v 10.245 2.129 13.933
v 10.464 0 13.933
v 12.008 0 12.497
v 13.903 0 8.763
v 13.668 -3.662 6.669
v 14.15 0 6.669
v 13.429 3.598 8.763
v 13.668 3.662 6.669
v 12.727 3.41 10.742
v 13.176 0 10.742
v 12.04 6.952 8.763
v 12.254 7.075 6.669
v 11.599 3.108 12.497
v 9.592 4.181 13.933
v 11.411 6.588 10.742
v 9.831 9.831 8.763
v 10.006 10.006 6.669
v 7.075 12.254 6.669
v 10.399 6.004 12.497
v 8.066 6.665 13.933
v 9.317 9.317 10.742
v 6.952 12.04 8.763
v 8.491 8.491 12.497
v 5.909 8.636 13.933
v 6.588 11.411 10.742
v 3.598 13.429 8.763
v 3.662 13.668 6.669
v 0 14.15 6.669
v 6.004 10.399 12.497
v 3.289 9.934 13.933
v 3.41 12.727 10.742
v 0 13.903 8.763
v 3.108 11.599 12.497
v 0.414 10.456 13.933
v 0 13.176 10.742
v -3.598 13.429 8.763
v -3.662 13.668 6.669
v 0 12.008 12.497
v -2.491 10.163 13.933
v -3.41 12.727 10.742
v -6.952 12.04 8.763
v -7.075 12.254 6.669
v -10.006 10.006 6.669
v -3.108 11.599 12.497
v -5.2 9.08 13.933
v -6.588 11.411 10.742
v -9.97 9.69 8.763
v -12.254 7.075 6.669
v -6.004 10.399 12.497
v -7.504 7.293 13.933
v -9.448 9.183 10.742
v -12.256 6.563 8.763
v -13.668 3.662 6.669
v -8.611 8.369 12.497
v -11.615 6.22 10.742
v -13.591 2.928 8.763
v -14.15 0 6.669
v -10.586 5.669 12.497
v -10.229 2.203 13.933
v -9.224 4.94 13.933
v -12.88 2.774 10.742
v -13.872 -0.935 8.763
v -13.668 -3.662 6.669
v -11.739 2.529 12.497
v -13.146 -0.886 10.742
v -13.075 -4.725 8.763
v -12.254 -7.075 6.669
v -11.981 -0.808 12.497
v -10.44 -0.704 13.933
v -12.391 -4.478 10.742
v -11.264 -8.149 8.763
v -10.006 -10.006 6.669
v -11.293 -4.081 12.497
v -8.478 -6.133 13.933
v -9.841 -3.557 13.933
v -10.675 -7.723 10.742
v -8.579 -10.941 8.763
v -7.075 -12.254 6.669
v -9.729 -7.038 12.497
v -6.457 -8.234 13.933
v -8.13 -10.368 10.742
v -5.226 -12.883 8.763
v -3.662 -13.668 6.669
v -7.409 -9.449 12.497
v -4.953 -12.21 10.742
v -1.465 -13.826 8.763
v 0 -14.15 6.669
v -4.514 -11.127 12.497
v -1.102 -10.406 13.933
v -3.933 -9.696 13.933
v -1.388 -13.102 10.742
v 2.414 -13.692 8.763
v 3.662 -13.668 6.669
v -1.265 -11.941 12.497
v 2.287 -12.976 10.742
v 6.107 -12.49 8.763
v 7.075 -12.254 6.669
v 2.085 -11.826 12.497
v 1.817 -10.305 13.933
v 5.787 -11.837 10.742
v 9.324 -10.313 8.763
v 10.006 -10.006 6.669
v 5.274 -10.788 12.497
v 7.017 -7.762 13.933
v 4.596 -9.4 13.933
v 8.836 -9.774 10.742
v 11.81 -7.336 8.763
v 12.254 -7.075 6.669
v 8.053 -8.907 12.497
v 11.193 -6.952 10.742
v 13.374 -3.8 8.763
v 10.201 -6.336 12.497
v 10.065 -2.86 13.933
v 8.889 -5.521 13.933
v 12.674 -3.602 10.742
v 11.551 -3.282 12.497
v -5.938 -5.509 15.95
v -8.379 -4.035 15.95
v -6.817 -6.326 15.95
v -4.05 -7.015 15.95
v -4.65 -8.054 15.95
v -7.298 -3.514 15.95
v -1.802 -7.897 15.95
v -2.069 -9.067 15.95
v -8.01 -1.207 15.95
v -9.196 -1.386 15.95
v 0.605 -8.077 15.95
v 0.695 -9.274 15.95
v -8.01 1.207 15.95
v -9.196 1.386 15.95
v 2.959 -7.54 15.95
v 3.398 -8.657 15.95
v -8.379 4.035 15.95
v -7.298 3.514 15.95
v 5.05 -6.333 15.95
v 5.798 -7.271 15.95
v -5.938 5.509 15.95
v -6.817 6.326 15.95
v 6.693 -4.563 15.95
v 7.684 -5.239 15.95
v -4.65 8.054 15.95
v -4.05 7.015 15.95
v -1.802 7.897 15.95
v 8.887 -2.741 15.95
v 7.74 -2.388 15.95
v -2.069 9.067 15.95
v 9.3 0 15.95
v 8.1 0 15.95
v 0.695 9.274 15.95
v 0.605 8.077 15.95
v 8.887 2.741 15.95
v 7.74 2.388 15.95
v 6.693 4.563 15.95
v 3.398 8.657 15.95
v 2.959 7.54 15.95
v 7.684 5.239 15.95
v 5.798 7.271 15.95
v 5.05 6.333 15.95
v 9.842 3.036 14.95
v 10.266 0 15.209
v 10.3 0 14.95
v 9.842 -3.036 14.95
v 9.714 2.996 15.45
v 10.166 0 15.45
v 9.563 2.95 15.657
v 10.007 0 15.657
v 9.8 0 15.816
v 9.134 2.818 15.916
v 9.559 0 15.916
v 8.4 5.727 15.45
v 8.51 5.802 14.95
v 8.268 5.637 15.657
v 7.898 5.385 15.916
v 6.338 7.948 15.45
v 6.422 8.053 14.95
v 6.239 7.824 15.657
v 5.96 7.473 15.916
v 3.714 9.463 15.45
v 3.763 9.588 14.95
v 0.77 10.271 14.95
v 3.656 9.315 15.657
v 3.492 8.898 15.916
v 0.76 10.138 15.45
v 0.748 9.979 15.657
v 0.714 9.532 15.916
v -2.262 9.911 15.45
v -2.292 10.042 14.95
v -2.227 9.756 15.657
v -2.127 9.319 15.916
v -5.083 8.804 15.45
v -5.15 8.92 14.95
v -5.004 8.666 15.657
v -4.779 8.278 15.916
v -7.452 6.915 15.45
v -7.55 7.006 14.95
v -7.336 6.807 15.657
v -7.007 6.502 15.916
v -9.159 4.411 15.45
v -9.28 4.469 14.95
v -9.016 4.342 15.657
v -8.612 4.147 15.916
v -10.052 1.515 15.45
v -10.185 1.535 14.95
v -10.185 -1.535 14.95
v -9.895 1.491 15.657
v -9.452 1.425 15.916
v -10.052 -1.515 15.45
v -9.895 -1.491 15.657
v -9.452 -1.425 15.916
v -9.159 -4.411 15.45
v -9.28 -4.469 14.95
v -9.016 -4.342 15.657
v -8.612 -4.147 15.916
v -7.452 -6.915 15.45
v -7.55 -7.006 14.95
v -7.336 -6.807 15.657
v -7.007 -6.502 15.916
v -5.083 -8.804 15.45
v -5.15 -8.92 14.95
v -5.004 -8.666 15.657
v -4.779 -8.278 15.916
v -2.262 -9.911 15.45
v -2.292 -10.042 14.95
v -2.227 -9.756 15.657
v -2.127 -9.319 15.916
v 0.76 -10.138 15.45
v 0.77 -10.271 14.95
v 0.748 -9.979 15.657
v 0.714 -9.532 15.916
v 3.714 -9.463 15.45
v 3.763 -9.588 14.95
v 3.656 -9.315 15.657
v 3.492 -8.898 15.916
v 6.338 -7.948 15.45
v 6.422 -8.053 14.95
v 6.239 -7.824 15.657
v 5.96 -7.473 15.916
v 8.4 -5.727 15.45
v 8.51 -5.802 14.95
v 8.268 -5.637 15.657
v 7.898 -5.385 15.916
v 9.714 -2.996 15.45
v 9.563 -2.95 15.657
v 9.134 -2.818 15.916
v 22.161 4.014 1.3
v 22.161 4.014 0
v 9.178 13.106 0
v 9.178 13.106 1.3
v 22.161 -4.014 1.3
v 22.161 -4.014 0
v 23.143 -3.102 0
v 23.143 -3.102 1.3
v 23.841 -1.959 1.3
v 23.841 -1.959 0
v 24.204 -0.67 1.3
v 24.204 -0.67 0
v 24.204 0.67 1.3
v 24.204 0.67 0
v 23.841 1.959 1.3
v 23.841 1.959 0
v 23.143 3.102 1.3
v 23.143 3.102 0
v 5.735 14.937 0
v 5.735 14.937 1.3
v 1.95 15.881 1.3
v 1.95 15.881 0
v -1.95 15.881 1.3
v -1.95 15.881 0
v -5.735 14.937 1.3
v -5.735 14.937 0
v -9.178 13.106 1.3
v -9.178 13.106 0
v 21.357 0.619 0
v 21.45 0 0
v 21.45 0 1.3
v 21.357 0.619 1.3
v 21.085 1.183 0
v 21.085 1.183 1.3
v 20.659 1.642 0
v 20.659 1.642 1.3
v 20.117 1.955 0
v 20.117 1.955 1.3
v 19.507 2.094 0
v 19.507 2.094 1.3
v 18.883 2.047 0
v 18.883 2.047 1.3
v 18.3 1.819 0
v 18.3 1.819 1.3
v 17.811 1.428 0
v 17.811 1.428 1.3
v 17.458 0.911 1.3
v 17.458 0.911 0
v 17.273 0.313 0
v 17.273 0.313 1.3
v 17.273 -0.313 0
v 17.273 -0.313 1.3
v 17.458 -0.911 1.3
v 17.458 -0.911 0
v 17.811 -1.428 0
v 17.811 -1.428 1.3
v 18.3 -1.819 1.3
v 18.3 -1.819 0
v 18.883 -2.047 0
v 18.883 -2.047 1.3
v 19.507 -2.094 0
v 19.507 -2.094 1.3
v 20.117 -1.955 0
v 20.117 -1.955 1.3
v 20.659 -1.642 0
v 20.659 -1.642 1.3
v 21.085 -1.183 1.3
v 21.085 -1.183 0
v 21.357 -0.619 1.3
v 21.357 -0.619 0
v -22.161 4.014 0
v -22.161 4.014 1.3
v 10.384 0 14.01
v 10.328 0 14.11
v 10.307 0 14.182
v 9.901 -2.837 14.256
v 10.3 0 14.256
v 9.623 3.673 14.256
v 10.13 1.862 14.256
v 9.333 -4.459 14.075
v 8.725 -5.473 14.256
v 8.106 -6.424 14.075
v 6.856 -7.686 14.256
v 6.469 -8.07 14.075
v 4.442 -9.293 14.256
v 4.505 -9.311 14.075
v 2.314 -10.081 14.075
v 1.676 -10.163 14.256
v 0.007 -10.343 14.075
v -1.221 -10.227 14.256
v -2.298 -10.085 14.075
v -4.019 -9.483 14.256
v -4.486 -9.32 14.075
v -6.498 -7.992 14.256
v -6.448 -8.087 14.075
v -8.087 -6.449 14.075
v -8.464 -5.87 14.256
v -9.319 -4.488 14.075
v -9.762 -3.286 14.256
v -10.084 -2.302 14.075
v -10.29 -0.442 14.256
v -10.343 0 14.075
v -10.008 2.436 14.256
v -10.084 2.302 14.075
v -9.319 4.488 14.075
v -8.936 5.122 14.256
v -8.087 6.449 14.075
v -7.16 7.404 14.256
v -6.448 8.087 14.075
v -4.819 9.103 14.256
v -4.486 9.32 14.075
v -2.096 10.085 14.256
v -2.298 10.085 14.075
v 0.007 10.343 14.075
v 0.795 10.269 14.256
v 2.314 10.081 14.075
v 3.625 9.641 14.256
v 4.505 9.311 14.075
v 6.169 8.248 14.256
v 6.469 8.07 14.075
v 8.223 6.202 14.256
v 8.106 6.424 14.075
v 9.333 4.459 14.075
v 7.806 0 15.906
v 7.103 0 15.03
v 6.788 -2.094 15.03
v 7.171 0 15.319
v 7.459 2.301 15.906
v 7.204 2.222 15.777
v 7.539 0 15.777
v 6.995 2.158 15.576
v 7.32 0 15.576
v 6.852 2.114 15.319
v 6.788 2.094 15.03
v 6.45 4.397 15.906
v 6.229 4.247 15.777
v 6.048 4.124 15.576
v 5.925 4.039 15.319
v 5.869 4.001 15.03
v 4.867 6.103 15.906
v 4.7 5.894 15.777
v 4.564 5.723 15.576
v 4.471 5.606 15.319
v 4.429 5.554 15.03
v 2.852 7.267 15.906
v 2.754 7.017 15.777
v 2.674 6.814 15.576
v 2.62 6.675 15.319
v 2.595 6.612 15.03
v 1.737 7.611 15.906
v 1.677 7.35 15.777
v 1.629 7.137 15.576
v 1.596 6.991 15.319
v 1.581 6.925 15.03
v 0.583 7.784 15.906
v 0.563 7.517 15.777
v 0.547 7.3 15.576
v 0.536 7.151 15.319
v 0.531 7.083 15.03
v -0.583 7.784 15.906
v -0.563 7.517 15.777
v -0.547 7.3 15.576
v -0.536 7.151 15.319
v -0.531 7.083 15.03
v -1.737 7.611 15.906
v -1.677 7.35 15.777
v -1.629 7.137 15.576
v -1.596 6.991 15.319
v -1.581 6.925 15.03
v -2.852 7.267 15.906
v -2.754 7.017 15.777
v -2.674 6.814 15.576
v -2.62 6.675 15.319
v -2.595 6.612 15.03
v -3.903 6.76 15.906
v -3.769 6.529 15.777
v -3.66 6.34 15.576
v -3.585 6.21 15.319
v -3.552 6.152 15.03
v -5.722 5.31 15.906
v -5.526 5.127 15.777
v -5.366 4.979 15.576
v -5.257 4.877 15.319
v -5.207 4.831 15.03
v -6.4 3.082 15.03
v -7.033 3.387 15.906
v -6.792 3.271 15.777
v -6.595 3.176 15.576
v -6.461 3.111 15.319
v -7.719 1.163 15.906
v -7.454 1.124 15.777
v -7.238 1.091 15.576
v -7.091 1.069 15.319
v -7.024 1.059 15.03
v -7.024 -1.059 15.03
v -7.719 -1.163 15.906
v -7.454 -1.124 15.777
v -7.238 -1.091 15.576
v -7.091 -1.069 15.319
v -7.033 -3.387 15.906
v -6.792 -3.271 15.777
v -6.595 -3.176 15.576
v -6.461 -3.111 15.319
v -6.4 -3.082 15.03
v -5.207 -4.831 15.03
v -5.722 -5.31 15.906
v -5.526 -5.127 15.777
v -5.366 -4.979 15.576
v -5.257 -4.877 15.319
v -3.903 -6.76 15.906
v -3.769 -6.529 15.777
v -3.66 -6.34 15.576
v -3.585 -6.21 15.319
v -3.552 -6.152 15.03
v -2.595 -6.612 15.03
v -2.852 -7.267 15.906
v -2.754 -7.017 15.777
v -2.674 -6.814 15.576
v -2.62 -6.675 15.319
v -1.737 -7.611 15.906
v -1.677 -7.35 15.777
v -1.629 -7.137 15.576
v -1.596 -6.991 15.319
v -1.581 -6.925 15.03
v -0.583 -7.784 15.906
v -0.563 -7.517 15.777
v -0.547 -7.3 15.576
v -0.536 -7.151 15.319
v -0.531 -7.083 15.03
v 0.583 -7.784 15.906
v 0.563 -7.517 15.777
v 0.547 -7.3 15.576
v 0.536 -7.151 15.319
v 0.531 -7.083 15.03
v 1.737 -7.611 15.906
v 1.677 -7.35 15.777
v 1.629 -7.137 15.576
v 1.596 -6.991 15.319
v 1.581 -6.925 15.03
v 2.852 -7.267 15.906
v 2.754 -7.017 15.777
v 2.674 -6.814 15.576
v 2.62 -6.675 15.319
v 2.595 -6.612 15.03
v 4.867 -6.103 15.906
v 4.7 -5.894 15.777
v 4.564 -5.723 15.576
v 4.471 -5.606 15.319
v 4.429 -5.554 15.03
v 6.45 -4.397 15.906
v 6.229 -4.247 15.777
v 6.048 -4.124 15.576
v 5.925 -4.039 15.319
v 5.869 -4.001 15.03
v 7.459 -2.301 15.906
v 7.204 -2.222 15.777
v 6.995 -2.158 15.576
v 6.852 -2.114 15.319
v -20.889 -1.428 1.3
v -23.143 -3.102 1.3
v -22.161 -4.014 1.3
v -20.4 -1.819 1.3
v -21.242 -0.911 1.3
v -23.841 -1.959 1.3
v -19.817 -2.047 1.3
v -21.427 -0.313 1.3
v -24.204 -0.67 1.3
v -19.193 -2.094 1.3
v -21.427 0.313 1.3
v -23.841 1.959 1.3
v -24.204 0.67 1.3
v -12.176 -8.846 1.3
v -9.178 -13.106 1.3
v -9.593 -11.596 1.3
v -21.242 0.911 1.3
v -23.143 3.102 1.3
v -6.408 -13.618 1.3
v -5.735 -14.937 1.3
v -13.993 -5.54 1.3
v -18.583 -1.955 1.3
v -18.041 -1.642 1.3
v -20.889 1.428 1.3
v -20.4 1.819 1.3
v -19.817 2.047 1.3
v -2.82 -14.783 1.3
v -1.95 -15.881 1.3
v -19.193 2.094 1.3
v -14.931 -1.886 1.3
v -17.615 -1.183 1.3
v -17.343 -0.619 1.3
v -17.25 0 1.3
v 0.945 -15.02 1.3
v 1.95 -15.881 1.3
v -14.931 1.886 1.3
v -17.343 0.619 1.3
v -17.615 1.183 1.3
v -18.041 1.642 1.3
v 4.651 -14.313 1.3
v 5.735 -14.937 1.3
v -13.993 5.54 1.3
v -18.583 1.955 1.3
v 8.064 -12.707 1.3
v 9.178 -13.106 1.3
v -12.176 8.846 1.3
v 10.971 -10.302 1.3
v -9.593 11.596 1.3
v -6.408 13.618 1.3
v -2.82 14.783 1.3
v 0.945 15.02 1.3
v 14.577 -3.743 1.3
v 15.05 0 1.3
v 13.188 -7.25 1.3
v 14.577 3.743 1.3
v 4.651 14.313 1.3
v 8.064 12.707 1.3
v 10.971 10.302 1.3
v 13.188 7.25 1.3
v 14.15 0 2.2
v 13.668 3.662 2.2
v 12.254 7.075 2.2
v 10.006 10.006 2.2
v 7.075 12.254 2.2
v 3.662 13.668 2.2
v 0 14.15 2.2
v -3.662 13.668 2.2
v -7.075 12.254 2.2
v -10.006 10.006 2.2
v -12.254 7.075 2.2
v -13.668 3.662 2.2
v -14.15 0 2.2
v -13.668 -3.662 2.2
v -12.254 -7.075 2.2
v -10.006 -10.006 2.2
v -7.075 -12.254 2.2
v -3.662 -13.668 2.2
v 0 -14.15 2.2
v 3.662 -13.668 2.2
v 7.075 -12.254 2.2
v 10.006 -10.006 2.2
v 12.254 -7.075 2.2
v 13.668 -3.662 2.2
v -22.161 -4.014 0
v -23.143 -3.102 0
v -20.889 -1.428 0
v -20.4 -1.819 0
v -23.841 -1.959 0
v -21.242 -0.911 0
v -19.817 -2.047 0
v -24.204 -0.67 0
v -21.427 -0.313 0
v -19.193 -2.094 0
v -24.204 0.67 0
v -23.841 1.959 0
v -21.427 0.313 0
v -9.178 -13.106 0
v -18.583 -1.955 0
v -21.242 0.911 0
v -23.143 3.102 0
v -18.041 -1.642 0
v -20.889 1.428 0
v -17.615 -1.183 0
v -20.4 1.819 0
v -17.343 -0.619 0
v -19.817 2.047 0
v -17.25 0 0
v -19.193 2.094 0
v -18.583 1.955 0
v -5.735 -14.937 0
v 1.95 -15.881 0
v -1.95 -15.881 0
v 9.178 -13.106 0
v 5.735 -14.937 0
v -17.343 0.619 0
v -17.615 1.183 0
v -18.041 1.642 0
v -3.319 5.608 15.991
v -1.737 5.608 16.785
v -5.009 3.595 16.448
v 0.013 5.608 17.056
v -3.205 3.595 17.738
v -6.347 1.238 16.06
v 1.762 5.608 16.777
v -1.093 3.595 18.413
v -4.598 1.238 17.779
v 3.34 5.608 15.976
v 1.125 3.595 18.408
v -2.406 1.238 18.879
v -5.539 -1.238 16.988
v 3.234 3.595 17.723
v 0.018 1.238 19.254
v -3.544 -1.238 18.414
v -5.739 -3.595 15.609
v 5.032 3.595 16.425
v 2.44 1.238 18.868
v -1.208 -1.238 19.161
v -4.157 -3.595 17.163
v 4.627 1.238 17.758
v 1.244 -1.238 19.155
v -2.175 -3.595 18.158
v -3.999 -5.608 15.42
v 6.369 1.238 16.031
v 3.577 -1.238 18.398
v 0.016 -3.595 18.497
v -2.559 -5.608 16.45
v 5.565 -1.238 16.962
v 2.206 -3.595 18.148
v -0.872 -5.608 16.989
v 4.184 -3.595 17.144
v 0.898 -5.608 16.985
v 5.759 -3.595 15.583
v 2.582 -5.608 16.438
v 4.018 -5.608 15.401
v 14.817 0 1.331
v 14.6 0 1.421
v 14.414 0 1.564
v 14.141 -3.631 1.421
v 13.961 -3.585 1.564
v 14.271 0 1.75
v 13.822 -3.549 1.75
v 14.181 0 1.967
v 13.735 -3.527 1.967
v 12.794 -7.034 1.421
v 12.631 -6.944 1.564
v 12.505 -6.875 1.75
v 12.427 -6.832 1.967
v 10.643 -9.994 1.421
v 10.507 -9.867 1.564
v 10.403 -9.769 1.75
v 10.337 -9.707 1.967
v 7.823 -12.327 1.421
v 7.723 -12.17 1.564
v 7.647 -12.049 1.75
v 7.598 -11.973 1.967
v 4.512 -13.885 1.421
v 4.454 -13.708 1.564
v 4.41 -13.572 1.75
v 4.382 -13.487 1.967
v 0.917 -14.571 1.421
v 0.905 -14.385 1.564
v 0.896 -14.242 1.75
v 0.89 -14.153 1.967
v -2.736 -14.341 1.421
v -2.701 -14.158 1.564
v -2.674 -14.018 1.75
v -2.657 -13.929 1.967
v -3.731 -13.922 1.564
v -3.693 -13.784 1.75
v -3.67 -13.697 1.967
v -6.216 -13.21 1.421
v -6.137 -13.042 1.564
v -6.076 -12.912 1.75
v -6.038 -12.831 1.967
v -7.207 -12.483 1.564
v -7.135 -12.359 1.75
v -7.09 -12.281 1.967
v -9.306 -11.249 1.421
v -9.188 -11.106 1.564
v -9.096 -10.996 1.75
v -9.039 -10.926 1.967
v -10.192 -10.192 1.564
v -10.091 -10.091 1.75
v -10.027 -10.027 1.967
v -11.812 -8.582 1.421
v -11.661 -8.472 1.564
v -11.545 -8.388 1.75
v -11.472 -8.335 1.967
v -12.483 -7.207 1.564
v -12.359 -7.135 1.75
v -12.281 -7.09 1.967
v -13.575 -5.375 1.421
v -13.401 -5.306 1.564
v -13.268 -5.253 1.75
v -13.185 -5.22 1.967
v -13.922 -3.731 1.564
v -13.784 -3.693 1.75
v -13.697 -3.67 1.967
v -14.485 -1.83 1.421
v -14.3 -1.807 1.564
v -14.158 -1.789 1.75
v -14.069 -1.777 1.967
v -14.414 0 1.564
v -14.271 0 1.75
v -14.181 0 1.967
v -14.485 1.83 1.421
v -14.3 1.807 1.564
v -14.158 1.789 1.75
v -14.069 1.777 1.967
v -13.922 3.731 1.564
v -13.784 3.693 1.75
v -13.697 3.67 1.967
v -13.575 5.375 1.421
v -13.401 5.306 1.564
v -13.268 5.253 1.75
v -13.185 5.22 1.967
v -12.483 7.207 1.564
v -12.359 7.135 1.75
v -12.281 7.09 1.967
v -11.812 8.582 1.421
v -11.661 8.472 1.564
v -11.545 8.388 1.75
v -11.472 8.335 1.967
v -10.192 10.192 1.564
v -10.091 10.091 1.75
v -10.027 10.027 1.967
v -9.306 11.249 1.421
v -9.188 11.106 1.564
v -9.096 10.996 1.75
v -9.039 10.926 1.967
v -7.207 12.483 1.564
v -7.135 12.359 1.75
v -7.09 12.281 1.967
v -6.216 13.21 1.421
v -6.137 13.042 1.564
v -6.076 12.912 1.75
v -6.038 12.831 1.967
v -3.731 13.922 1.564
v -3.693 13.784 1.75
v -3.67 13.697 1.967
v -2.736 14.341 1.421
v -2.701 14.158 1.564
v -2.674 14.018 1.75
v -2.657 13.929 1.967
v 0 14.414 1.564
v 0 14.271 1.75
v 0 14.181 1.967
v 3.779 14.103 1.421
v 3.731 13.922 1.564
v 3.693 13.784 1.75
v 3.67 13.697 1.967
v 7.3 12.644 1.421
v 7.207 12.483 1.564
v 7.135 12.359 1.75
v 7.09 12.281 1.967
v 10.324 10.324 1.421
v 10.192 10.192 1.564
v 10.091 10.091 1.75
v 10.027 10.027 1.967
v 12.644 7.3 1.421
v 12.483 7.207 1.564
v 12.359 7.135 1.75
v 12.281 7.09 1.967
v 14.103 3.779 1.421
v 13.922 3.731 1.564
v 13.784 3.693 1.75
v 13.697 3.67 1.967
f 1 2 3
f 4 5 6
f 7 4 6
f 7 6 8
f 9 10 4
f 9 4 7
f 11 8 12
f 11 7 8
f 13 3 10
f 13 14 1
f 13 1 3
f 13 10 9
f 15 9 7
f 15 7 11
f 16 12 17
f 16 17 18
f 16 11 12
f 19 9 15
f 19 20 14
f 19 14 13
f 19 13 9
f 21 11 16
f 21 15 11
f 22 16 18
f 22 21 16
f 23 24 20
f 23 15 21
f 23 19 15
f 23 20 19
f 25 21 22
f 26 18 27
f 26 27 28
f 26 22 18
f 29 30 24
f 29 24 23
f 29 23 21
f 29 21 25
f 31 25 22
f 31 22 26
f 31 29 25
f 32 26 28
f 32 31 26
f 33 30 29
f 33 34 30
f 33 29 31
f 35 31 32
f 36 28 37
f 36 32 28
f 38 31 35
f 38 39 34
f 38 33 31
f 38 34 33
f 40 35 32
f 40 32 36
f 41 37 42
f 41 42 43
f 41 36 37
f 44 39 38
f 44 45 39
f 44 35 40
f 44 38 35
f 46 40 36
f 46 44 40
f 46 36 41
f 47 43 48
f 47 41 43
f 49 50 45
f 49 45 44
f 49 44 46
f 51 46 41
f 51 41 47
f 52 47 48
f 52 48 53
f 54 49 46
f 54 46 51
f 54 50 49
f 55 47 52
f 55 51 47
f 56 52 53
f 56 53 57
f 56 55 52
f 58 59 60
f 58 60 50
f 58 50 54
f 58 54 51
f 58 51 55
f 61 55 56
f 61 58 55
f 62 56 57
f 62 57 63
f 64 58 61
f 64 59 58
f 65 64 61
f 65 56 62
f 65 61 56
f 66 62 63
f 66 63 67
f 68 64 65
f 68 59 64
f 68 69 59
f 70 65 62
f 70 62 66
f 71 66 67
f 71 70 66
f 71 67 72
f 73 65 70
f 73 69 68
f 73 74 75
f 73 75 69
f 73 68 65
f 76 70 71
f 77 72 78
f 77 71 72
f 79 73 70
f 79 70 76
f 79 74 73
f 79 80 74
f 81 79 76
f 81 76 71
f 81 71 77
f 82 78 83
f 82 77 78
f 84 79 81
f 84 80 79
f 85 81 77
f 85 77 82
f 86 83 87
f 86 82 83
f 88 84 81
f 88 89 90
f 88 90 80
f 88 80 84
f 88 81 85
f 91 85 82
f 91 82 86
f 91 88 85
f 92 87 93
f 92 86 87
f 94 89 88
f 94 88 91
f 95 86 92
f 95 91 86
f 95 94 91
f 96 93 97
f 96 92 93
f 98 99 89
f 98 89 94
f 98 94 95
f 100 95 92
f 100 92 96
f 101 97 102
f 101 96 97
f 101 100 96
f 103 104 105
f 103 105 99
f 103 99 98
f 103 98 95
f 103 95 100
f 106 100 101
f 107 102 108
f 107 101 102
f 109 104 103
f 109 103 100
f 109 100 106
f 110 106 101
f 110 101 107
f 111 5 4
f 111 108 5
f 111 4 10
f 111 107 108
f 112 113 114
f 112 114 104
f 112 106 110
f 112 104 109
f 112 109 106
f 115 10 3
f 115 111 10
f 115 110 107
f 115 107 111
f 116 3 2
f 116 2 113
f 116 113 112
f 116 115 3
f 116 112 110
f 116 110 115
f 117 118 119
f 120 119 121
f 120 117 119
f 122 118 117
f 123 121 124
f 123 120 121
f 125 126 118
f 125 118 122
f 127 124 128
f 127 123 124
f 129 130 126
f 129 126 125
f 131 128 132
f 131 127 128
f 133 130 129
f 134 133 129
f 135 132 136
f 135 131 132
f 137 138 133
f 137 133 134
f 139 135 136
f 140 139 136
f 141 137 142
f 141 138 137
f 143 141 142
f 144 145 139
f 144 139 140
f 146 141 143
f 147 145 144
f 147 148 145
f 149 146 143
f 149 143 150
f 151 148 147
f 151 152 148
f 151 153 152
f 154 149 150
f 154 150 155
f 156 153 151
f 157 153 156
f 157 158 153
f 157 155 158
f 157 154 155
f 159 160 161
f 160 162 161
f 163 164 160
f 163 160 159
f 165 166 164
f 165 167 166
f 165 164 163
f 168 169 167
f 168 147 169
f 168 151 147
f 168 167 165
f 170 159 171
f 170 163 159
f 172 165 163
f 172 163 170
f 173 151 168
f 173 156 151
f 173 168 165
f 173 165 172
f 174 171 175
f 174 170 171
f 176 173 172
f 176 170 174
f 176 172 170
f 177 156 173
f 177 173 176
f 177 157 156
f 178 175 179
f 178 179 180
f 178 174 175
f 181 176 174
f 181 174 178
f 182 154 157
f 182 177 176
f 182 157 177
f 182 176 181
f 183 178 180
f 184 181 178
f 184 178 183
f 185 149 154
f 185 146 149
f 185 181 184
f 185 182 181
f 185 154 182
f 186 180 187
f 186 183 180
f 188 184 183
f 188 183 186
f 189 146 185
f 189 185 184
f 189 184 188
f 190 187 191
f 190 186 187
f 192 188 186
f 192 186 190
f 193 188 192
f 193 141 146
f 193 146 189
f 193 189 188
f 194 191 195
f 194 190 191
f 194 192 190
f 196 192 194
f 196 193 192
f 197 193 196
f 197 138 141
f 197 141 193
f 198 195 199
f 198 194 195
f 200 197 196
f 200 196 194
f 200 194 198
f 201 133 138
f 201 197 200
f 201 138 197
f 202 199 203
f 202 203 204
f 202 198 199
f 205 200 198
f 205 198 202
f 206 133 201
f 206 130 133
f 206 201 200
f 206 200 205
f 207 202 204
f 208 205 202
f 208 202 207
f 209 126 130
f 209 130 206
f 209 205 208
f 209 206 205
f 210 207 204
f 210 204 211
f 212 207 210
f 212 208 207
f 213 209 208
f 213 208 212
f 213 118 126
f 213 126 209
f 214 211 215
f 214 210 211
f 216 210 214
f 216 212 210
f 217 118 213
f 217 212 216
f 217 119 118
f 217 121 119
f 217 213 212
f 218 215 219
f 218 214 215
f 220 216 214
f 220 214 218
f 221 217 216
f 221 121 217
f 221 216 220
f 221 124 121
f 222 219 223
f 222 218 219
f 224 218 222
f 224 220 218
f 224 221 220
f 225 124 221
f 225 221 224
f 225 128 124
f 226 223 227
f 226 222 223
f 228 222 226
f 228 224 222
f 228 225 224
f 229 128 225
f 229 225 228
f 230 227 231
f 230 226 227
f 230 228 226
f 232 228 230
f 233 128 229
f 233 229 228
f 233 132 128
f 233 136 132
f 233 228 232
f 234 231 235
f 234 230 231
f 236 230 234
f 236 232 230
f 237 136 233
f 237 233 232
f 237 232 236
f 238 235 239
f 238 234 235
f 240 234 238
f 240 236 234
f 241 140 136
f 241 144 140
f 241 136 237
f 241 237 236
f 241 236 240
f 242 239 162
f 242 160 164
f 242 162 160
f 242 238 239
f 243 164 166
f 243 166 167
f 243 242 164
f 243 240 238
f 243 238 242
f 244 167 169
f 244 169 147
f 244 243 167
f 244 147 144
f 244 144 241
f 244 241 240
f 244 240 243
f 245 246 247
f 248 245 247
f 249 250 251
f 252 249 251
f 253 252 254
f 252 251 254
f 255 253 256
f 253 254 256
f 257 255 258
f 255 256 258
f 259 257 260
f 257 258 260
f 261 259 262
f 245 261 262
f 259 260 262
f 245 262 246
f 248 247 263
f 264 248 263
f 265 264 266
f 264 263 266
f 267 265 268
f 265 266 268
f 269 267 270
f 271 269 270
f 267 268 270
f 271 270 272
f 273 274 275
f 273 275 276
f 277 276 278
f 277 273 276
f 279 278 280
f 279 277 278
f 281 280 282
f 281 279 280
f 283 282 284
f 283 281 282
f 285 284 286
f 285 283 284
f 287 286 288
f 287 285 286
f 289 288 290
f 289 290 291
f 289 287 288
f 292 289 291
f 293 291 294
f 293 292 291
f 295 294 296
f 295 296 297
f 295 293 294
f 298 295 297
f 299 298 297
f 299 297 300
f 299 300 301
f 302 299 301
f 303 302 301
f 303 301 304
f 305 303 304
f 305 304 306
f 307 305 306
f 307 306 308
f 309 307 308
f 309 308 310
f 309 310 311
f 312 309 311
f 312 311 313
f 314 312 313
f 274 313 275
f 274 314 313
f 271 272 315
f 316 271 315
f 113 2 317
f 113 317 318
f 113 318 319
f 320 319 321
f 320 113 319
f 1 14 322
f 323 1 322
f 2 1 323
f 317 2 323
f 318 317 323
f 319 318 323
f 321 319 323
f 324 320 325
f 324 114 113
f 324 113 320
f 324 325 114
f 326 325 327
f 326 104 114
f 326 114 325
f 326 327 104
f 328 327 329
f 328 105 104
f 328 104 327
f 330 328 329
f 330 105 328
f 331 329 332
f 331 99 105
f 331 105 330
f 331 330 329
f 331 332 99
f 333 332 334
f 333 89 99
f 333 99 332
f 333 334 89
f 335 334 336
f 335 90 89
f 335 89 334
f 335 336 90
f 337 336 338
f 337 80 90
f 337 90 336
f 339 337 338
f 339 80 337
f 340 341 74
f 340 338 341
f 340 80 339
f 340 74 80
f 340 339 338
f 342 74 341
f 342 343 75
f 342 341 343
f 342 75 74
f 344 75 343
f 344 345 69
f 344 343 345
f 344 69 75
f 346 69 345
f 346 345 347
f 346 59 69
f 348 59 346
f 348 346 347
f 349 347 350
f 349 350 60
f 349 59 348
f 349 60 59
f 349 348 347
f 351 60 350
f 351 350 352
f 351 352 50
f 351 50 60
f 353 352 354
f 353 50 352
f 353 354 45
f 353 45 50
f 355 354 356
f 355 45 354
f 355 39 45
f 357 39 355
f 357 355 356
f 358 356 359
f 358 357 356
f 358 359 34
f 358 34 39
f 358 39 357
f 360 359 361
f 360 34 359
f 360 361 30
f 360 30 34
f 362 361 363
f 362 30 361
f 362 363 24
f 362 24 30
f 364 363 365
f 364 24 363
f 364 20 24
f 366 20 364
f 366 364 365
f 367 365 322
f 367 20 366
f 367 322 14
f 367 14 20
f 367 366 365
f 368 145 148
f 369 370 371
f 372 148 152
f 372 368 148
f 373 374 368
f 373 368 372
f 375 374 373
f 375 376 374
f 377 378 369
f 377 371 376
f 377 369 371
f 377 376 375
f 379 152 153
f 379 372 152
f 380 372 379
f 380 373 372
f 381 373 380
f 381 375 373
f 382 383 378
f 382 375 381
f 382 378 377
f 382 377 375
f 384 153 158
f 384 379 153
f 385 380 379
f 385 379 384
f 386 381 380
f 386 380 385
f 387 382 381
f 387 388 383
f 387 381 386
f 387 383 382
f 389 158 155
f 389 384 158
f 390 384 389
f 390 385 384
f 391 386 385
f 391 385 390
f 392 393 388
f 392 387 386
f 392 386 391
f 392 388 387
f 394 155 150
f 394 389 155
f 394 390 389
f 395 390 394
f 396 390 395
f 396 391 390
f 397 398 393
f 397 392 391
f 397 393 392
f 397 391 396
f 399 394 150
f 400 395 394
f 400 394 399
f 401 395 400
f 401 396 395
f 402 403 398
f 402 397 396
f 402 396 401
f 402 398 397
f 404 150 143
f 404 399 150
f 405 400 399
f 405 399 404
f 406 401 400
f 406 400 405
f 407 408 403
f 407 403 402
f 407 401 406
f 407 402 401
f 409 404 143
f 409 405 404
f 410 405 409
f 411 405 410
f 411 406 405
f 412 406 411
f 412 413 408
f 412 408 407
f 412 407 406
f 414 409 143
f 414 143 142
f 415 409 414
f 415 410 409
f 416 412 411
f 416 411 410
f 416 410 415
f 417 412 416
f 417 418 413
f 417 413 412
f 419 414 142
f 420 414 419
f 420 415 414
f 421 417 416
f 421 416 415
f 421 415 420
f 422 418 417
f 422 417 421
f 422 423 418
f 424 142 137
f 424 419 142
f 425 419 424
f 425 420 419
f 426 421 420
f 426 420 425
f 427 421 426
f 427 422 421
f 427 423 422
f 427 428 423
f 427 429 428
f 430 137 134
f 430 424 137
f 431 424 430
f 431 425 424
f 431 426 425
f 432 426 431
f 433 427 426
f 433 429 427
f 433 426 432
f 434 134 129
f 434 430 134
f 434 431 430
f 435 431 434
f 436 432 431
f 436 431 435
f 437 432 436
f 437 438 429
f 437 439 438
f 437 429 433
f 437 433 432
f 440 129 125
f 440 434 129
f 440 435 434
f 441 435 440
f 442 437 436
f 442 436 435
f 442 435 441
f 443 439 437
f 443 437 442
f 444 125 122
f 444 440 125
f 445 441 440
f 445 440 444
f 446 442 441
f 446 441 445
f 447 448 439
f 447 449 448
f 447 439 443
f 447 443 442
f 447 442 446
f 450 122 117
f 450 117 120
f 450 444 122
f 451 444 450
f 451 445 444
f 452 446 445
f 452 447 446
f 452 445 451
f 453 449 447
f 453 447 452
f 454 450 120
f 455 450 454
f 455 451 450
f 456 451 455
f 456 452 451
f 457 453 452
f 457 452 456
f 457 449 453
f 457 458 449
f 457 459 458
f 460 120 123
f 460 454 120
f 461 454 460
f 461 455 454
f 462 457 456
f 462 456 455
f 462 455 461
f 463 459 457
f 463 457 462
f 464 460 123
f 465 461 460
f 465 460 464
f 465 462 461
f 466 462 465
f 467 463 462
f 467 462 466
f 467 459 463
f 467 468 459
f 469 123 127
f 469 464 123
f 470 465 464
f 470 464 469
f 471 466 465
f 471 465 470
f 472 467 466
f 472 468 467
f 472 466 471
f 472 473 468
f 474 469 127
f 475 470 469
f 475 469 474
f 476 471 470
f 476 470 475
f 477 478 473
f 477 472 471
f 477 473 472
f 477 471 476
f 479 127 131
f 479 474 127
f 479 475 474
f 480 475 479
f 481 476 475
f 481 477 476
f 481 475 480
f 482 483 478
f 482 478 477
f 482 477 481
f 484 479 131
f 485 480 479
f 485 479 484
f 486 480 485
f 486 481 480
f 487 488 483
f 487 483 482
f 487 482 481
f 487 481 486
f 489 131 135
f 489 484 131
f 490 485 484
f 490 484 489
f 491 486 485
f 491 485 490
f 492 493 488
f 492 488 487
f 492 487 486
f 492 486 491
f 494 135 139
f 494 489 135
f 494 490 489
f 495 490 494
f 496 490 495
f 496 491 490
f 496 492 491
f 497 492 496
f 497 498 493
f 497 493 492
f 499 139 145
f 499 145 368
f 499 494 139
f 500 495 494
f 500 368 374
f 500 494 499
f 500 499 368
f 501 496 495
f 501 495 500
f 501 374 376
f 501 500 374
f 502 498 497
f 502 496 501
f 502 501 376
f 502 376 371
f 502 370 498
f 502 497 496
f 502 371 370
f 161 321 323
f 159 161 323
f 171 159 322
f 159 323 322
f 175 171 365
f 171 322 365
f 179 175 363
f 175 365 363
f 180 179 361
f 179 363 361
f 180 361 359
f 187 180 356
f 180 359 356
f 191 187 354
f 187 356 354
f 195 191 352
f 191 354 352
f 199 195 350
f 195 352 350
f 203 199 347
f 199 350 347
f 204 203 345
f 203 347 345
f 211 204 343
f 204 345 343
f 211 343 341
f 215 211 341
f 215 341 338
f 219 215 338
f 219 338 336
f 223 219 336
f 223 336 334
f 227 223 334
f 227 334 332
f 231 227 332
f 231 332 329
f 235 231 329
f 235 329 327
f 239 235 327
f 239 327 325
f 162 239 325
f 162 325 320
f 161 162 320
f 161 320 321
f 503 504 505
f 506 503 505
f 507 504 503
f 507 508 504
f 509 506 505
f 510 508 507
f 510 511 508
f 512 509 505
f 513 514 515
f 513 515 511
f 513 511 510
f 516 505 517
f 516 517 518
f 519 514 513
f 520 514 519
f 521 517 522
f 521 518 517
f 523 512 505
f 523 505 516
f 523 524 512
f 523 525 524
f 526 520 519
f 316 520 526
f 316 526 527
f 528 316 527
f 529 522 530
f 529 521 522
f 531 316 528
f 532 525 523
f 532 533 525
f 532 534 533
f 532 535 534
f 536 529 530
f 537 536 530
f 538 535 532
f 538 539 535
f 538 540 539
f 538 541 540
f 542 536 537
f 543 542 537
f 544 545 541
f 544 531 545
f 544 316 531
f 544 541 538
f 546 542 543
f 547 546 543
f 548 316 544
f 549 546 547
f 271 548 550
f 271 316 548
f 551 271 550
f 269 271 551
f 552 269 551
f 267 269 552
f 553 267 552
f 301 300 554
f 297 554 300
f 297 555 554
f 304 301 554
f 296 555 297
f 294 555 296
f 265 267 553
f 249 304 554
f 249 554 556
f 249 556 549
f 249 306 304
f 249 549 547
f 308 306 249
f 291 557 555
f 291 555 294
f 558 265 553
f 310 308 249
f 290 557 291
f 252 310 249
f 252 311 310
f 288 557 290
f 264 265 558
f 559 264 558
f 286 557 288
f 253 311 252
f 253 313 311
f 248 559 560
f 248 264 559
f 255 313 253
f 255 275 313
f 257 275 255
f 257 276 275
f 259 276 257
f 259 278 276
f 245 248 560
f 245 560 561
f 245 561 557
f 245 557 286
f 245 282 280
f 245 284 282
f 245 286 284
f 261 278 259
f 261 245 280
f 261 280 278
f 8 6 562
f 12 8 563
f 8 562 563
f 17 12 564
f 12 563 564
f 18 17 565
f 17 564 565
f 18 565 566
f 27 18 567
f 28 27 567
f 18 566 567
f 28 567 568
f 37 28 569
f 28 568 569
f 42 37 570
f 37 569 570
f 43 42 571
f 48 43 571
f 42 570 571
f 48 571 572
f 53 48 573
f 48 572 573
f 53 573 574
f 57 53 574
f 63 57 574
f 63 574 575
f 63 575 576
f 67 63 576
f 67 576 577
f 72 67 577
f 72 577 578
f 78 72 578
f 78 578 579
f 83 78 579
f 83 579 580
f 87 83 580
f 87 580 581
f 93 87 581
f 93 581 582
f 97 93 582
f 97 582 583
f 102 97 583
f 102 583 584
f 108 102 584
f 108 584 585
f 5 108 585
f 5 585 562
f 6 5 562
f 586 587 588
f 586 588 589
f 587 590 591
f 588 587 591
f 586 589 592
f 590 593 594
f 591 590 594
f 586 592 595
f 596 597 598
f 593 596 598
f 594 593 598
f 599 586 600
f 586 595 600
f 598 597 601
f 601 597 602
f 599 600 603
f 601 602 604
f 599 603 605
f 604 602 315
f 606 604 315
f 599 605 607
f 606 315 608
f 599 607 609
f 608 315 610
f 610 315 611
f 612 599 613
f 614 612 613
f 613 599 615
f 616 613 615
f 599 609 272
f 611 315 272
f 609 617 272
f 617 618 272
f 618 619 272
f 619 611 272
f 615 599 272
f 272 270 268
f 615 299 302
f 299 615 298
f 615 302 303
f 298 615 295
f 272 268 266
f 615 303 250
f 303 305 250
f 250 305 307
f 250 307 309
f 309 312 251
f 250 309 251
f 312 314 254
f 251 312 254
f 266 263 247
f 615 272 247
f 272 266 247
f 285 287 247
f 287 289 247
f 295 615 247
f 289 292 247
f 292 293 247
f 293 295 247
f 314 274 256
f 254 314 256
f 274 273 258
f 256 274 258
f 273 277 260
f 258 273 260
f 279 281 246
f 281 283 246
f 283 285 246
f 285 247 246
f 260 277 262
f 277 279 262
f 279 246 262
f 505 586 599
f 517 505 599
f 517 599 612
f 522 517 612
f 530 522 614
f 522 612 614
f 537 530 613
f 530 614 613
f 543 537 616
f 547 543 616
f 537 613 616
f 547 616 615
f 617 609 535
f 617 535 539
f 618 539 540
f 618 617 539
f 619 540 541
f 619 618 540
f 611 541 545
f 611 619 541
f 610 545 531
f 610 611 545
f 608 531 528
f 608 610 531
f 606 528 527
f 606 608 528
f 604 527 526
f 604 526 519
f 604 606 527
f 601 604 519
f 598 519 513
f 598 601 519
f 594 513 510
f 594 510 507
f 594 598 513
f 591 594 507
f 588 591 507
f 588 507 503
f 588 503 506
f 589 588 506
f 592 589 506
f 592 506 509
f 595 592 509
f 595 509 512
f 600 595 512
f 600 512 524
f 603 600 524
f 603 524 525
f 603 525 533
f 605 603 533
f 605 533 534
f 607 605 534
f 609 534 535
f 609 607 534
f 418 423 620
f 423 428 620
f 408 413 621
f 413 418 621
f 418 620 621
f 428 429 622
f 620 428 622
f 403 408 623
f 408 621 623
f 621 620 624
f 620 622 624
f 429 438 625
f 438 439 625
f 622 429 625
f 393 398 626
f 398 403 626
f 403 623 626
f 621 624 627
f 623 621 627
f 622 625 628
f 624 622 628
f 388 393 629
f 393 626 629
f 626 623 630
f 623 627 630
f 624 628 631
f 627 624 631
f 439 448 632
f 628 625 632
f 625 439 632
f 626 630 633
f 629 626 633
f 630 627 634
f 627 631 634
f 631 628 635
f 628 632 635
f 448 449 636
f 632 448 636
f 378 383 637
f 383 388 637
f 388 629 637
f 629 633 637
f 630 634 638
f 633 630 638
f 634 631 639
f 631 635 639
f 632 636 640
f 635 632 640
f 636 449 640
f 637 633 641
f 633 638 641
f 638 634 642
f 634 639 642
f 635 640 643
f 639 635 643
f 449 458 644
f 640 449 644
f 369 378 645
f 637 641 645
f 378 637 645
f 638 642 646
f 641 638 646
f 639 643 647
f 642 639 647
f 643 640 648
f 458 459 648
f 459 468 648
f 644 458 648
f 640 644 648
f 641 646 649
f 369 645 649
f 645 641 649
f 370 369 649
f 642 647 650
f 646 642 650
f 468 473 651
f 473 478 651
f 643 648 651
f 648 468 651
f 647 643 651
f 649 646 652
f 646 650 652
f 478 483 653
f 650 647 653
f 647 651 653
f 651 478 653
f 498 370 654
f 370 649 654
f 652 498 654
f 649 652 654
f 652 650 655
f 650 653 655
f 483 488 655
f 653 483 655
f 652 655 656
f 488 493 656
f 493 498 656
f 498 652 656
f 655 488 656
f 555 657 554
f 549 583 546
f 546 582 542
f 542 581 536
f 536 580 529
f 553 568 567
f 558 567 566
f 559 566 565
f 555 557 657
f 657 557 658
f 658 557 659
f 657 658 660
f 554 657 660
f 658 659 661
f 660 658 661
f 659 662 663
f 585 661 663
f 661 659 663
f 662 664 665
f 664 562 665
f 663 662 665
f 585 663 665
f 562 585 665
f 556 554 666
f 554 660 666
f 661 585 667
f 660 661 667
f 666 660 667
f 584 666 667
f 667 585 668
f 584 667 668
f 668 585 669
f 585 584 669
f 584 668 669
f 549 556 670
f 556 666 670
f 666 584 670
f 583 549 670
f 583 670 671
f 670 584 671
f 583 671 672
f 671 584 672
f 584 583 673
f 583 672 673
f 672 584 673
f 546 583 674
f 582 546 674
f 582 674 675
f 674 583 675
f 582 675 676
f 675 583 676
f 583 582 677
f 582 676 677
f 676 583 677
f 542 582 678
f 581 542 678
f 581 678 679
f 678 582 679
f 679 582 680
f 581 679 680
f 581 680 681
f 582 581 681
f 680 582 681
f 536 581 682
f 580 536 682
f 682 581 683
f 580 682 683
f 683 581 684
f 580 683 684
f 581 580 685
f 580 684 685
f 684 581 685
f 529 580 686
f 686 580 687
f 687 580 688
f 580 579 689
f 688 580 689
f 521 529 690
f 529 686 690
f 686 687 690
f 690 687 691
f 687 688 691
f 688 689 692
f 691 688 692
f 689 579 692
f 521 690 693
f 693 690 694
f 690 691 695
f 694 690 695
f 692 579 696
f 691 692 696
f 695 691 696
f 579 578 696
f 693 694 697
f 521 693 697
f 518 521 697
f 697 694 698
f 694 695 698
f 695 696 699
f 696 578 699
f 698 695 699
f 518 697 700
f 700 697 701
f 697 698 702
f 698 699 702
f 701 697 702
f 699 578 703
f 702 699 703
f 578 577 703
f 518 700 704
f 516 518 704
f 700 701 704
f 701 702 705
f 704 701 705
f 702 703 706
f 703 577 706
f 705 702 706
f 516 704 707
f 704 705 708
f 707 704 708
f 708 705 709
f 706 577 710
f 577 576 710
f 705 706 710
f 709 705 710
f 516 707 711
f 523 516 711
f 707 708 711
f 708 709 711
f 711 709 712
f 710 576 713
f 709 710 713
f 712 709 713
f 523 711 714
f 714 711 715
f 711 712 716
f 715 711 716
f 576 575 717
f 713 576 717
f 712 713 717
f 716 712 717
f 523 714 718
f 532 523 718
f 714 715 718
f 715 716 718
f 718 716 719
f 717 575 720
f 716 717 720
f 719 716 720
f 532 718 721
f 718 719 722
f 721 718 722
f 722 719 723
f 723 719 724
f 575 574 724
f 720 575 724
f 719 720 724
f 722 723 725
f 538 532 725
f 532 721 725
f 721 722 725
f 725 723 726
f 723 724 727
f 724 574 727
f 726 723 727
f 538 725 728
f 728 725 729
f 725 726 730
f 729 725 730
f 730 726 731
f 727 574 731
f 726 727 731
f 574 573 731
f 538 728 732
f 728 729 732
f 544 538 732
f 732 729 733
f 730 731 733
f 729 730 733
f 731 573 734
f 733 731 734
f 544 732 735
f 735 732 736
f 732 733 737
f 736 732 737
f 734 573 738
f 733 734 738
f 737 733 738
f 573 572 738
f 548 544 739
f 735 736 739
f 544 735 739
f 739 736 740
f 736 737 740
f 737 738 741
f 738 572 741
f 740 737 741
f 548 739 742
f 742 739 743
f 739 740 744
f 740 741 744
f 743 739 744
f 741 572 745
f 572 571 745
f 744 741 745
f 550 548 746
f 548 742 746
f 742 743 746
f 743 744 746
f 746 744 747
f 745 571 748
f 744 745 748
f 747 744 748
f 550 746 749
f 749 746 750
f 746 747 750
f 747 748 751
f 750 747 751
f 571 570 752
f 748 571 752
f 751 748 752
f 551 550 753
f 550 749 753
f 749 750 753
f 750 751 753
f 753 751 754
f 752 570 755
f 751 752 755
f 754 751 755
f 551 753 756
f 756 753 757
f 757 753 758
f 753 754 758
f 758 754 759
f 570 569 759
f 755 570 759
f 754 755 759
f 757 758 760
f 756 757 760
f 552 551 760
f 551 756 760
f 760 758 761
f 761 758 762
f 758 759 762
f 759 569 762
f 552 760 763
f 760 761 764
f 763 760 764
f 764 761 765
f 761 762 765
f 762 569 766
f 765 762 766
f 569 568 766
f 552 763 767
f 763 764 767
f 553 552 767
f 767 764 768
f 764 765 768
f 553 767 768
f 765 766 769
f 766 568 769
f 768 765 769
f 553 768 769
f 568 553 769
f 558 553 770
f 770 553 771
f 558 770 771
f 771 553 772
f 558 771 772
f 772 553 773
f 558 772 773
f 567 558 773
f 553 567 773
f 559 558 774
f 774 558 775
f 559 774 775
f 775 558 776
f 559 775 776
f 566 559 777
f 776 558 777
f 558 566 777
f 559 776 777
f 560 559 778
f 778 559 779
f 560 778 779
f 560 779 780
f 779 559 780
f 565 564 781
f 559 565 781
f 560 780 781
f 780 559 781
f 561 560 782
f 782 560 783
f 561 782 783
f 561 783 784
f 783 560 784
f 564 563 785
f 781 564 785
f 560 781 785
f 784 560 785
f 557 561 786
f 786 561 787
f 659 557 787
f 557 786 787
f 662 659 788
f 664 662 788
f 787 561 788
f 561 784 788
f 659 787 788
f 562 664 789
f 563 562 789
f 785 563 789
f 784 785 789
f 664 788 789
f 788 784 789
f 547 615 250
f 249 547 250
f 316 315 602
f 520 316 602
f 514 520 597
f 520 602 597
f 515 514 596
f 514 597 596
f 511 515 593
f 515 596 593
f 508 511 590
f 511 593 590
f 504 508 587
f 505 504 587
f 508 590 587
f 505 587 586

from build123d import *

# Parameters (mm, degrees)
F0_R     = 2.1
F0_R_2   = 14.15
F0_R_3   = 10.3
F0_R_4   = 7.1
F1_DEPTH = 1.3
F2_DEPTH = 14.05
F3_DEPTH = 15.95
F4_R     = 0.9
F6_R     = 0.4
F7_R     = 1


# Not quite as in the source:
# - a fillet or chamfer that OpenCascade refuses, or shapes differently, is made with other operations: its cross-section is extruded or revolved along the edge and cut away or added


with BuildPart() as f1:
    # F0 (on Top) → F1 (new body)
    with BuildSketch(Plane.XY):
        with BuildLine():
            Line((9.1782945736, -13.1056823065), (22.1608527132, -4.0136152064))
            ThreePointArc((22.1608527132, -4.0136152064), (24.25, 0), (22.1608527132, 4.0136152064))
            Line((22.1608527132, 4.0136152064), (9.1782945736, 13.1056823065))
            ThreePointArc((9.1782945736, 13.1056823065), (0, 16), (-9.1782945736, 13.1056823065))
            Line((-9.1782945736, 13.1056823065), (-22.1608527132, 4.0136152064))
            ThreePointArc((-22.1608527132, 4.0136152064), (-24.25, 0), (-22.1608527132, -4.0136152064))
            Line((-22.1608527132, -4.0136152064), (-9.1782945736, -13.1056823065))
            ThreePointArc((-9.1782945736, -13.1056823065), (0, -16), (9.1782945736, -13.1056823065))
        make_face()
        with Locations((-19.35, 0)):
            Circle(F0_R, mode=Mode.SUBTRACT)
        Circle(F0_R_2, mode=Mode.SUBTRACT)
        with Locations((19.35, 0)):
            Circle(F0_R, mode=Mode.SUBTRACT)
        Circle(F0_R_2)
        Circle(F0_R_3, mode=Mode.SUBTRACT)
        Circle(F0_R_3)
        Circle(F0_R_4, mode=Mode.SUBTRACT)
        Circle(F0_R_4)
    extrude(amount=F1_DEPTH)

    # F0 (on Top) → F2 (join)
    with BuildSketch(Plane.XY):
        Circle(F0_R_2)
        Circle(F0_R_3, mode=Mode.SUBTRACT)
        Circle(F0_R_3)
        Circle(F0_R_4, mode=Mode.SUBTRACT)
        Circle(F0_R_4)
    extrude(amount=F2_DEPTH)

    # F0 (on Top) → F3 (join)
    with BuildSketch(Plane.XY):
        Circle(F0_R_3)
        Circle(F0_R_4, mode=Mode.SUBTRACT)
    extrude(amount=F3_DEPTH)

    # F4
    f4_edges = [f1.edges().sort_by_distance(p)[0] for p in [
        (-14.15, 0, 1.3),
    ]]
    fillet(f4_edges, radius=F4_R)

    # F5: fillet of radius 9 on 1 edges, made by hand

    # F5_s1 → F5_t2 (revolve, cut)
    with BuildSketch(Plane.XZ):
        with BuildLine():
            ThreePointArc((14.15, 6.6691125195), (13.129661647, 10.8314435971), (10.3, 14.05))
            Line((10.3, 14.05), (14.15, 14.05))
            Line((14.15, 14.05), (14.15, 6.6691125195))
        make_face()
    revolve(axis=Axis((0, 0, 14.05), (0, 0, 1)), mode=Mode.SUBTRACT)

    # F6
    f6_edges = [f1.edges().sort_by_distance(p)[0] for p in [
        (-10.3, 0, 14.05),
    ]]
    fillet(f6_edges, radius=F6_R)

    # F7
    f7_edges = [f1.edges().sort_by_distance(p)[0] for p in [
        (-10.3, 0, 15.95),
        (-7.1, 0, 15.95),
    ]]
    fillet(f7_edges, radius=F7_R)

    # F9 (on offset) → F10 (revolve)
    with BuildSketch(Plane.XY.offset(11.35)):
        with BuildLine():
            Line((0, -8), (0, 8))
            ThreePointArc((0, 8), (-8, 0), (0, -8))
        make_face()
    revolve(axis=Axis((0, -0.0622457136, 11.35), (0, 1, 0)))


solid = f1.part
